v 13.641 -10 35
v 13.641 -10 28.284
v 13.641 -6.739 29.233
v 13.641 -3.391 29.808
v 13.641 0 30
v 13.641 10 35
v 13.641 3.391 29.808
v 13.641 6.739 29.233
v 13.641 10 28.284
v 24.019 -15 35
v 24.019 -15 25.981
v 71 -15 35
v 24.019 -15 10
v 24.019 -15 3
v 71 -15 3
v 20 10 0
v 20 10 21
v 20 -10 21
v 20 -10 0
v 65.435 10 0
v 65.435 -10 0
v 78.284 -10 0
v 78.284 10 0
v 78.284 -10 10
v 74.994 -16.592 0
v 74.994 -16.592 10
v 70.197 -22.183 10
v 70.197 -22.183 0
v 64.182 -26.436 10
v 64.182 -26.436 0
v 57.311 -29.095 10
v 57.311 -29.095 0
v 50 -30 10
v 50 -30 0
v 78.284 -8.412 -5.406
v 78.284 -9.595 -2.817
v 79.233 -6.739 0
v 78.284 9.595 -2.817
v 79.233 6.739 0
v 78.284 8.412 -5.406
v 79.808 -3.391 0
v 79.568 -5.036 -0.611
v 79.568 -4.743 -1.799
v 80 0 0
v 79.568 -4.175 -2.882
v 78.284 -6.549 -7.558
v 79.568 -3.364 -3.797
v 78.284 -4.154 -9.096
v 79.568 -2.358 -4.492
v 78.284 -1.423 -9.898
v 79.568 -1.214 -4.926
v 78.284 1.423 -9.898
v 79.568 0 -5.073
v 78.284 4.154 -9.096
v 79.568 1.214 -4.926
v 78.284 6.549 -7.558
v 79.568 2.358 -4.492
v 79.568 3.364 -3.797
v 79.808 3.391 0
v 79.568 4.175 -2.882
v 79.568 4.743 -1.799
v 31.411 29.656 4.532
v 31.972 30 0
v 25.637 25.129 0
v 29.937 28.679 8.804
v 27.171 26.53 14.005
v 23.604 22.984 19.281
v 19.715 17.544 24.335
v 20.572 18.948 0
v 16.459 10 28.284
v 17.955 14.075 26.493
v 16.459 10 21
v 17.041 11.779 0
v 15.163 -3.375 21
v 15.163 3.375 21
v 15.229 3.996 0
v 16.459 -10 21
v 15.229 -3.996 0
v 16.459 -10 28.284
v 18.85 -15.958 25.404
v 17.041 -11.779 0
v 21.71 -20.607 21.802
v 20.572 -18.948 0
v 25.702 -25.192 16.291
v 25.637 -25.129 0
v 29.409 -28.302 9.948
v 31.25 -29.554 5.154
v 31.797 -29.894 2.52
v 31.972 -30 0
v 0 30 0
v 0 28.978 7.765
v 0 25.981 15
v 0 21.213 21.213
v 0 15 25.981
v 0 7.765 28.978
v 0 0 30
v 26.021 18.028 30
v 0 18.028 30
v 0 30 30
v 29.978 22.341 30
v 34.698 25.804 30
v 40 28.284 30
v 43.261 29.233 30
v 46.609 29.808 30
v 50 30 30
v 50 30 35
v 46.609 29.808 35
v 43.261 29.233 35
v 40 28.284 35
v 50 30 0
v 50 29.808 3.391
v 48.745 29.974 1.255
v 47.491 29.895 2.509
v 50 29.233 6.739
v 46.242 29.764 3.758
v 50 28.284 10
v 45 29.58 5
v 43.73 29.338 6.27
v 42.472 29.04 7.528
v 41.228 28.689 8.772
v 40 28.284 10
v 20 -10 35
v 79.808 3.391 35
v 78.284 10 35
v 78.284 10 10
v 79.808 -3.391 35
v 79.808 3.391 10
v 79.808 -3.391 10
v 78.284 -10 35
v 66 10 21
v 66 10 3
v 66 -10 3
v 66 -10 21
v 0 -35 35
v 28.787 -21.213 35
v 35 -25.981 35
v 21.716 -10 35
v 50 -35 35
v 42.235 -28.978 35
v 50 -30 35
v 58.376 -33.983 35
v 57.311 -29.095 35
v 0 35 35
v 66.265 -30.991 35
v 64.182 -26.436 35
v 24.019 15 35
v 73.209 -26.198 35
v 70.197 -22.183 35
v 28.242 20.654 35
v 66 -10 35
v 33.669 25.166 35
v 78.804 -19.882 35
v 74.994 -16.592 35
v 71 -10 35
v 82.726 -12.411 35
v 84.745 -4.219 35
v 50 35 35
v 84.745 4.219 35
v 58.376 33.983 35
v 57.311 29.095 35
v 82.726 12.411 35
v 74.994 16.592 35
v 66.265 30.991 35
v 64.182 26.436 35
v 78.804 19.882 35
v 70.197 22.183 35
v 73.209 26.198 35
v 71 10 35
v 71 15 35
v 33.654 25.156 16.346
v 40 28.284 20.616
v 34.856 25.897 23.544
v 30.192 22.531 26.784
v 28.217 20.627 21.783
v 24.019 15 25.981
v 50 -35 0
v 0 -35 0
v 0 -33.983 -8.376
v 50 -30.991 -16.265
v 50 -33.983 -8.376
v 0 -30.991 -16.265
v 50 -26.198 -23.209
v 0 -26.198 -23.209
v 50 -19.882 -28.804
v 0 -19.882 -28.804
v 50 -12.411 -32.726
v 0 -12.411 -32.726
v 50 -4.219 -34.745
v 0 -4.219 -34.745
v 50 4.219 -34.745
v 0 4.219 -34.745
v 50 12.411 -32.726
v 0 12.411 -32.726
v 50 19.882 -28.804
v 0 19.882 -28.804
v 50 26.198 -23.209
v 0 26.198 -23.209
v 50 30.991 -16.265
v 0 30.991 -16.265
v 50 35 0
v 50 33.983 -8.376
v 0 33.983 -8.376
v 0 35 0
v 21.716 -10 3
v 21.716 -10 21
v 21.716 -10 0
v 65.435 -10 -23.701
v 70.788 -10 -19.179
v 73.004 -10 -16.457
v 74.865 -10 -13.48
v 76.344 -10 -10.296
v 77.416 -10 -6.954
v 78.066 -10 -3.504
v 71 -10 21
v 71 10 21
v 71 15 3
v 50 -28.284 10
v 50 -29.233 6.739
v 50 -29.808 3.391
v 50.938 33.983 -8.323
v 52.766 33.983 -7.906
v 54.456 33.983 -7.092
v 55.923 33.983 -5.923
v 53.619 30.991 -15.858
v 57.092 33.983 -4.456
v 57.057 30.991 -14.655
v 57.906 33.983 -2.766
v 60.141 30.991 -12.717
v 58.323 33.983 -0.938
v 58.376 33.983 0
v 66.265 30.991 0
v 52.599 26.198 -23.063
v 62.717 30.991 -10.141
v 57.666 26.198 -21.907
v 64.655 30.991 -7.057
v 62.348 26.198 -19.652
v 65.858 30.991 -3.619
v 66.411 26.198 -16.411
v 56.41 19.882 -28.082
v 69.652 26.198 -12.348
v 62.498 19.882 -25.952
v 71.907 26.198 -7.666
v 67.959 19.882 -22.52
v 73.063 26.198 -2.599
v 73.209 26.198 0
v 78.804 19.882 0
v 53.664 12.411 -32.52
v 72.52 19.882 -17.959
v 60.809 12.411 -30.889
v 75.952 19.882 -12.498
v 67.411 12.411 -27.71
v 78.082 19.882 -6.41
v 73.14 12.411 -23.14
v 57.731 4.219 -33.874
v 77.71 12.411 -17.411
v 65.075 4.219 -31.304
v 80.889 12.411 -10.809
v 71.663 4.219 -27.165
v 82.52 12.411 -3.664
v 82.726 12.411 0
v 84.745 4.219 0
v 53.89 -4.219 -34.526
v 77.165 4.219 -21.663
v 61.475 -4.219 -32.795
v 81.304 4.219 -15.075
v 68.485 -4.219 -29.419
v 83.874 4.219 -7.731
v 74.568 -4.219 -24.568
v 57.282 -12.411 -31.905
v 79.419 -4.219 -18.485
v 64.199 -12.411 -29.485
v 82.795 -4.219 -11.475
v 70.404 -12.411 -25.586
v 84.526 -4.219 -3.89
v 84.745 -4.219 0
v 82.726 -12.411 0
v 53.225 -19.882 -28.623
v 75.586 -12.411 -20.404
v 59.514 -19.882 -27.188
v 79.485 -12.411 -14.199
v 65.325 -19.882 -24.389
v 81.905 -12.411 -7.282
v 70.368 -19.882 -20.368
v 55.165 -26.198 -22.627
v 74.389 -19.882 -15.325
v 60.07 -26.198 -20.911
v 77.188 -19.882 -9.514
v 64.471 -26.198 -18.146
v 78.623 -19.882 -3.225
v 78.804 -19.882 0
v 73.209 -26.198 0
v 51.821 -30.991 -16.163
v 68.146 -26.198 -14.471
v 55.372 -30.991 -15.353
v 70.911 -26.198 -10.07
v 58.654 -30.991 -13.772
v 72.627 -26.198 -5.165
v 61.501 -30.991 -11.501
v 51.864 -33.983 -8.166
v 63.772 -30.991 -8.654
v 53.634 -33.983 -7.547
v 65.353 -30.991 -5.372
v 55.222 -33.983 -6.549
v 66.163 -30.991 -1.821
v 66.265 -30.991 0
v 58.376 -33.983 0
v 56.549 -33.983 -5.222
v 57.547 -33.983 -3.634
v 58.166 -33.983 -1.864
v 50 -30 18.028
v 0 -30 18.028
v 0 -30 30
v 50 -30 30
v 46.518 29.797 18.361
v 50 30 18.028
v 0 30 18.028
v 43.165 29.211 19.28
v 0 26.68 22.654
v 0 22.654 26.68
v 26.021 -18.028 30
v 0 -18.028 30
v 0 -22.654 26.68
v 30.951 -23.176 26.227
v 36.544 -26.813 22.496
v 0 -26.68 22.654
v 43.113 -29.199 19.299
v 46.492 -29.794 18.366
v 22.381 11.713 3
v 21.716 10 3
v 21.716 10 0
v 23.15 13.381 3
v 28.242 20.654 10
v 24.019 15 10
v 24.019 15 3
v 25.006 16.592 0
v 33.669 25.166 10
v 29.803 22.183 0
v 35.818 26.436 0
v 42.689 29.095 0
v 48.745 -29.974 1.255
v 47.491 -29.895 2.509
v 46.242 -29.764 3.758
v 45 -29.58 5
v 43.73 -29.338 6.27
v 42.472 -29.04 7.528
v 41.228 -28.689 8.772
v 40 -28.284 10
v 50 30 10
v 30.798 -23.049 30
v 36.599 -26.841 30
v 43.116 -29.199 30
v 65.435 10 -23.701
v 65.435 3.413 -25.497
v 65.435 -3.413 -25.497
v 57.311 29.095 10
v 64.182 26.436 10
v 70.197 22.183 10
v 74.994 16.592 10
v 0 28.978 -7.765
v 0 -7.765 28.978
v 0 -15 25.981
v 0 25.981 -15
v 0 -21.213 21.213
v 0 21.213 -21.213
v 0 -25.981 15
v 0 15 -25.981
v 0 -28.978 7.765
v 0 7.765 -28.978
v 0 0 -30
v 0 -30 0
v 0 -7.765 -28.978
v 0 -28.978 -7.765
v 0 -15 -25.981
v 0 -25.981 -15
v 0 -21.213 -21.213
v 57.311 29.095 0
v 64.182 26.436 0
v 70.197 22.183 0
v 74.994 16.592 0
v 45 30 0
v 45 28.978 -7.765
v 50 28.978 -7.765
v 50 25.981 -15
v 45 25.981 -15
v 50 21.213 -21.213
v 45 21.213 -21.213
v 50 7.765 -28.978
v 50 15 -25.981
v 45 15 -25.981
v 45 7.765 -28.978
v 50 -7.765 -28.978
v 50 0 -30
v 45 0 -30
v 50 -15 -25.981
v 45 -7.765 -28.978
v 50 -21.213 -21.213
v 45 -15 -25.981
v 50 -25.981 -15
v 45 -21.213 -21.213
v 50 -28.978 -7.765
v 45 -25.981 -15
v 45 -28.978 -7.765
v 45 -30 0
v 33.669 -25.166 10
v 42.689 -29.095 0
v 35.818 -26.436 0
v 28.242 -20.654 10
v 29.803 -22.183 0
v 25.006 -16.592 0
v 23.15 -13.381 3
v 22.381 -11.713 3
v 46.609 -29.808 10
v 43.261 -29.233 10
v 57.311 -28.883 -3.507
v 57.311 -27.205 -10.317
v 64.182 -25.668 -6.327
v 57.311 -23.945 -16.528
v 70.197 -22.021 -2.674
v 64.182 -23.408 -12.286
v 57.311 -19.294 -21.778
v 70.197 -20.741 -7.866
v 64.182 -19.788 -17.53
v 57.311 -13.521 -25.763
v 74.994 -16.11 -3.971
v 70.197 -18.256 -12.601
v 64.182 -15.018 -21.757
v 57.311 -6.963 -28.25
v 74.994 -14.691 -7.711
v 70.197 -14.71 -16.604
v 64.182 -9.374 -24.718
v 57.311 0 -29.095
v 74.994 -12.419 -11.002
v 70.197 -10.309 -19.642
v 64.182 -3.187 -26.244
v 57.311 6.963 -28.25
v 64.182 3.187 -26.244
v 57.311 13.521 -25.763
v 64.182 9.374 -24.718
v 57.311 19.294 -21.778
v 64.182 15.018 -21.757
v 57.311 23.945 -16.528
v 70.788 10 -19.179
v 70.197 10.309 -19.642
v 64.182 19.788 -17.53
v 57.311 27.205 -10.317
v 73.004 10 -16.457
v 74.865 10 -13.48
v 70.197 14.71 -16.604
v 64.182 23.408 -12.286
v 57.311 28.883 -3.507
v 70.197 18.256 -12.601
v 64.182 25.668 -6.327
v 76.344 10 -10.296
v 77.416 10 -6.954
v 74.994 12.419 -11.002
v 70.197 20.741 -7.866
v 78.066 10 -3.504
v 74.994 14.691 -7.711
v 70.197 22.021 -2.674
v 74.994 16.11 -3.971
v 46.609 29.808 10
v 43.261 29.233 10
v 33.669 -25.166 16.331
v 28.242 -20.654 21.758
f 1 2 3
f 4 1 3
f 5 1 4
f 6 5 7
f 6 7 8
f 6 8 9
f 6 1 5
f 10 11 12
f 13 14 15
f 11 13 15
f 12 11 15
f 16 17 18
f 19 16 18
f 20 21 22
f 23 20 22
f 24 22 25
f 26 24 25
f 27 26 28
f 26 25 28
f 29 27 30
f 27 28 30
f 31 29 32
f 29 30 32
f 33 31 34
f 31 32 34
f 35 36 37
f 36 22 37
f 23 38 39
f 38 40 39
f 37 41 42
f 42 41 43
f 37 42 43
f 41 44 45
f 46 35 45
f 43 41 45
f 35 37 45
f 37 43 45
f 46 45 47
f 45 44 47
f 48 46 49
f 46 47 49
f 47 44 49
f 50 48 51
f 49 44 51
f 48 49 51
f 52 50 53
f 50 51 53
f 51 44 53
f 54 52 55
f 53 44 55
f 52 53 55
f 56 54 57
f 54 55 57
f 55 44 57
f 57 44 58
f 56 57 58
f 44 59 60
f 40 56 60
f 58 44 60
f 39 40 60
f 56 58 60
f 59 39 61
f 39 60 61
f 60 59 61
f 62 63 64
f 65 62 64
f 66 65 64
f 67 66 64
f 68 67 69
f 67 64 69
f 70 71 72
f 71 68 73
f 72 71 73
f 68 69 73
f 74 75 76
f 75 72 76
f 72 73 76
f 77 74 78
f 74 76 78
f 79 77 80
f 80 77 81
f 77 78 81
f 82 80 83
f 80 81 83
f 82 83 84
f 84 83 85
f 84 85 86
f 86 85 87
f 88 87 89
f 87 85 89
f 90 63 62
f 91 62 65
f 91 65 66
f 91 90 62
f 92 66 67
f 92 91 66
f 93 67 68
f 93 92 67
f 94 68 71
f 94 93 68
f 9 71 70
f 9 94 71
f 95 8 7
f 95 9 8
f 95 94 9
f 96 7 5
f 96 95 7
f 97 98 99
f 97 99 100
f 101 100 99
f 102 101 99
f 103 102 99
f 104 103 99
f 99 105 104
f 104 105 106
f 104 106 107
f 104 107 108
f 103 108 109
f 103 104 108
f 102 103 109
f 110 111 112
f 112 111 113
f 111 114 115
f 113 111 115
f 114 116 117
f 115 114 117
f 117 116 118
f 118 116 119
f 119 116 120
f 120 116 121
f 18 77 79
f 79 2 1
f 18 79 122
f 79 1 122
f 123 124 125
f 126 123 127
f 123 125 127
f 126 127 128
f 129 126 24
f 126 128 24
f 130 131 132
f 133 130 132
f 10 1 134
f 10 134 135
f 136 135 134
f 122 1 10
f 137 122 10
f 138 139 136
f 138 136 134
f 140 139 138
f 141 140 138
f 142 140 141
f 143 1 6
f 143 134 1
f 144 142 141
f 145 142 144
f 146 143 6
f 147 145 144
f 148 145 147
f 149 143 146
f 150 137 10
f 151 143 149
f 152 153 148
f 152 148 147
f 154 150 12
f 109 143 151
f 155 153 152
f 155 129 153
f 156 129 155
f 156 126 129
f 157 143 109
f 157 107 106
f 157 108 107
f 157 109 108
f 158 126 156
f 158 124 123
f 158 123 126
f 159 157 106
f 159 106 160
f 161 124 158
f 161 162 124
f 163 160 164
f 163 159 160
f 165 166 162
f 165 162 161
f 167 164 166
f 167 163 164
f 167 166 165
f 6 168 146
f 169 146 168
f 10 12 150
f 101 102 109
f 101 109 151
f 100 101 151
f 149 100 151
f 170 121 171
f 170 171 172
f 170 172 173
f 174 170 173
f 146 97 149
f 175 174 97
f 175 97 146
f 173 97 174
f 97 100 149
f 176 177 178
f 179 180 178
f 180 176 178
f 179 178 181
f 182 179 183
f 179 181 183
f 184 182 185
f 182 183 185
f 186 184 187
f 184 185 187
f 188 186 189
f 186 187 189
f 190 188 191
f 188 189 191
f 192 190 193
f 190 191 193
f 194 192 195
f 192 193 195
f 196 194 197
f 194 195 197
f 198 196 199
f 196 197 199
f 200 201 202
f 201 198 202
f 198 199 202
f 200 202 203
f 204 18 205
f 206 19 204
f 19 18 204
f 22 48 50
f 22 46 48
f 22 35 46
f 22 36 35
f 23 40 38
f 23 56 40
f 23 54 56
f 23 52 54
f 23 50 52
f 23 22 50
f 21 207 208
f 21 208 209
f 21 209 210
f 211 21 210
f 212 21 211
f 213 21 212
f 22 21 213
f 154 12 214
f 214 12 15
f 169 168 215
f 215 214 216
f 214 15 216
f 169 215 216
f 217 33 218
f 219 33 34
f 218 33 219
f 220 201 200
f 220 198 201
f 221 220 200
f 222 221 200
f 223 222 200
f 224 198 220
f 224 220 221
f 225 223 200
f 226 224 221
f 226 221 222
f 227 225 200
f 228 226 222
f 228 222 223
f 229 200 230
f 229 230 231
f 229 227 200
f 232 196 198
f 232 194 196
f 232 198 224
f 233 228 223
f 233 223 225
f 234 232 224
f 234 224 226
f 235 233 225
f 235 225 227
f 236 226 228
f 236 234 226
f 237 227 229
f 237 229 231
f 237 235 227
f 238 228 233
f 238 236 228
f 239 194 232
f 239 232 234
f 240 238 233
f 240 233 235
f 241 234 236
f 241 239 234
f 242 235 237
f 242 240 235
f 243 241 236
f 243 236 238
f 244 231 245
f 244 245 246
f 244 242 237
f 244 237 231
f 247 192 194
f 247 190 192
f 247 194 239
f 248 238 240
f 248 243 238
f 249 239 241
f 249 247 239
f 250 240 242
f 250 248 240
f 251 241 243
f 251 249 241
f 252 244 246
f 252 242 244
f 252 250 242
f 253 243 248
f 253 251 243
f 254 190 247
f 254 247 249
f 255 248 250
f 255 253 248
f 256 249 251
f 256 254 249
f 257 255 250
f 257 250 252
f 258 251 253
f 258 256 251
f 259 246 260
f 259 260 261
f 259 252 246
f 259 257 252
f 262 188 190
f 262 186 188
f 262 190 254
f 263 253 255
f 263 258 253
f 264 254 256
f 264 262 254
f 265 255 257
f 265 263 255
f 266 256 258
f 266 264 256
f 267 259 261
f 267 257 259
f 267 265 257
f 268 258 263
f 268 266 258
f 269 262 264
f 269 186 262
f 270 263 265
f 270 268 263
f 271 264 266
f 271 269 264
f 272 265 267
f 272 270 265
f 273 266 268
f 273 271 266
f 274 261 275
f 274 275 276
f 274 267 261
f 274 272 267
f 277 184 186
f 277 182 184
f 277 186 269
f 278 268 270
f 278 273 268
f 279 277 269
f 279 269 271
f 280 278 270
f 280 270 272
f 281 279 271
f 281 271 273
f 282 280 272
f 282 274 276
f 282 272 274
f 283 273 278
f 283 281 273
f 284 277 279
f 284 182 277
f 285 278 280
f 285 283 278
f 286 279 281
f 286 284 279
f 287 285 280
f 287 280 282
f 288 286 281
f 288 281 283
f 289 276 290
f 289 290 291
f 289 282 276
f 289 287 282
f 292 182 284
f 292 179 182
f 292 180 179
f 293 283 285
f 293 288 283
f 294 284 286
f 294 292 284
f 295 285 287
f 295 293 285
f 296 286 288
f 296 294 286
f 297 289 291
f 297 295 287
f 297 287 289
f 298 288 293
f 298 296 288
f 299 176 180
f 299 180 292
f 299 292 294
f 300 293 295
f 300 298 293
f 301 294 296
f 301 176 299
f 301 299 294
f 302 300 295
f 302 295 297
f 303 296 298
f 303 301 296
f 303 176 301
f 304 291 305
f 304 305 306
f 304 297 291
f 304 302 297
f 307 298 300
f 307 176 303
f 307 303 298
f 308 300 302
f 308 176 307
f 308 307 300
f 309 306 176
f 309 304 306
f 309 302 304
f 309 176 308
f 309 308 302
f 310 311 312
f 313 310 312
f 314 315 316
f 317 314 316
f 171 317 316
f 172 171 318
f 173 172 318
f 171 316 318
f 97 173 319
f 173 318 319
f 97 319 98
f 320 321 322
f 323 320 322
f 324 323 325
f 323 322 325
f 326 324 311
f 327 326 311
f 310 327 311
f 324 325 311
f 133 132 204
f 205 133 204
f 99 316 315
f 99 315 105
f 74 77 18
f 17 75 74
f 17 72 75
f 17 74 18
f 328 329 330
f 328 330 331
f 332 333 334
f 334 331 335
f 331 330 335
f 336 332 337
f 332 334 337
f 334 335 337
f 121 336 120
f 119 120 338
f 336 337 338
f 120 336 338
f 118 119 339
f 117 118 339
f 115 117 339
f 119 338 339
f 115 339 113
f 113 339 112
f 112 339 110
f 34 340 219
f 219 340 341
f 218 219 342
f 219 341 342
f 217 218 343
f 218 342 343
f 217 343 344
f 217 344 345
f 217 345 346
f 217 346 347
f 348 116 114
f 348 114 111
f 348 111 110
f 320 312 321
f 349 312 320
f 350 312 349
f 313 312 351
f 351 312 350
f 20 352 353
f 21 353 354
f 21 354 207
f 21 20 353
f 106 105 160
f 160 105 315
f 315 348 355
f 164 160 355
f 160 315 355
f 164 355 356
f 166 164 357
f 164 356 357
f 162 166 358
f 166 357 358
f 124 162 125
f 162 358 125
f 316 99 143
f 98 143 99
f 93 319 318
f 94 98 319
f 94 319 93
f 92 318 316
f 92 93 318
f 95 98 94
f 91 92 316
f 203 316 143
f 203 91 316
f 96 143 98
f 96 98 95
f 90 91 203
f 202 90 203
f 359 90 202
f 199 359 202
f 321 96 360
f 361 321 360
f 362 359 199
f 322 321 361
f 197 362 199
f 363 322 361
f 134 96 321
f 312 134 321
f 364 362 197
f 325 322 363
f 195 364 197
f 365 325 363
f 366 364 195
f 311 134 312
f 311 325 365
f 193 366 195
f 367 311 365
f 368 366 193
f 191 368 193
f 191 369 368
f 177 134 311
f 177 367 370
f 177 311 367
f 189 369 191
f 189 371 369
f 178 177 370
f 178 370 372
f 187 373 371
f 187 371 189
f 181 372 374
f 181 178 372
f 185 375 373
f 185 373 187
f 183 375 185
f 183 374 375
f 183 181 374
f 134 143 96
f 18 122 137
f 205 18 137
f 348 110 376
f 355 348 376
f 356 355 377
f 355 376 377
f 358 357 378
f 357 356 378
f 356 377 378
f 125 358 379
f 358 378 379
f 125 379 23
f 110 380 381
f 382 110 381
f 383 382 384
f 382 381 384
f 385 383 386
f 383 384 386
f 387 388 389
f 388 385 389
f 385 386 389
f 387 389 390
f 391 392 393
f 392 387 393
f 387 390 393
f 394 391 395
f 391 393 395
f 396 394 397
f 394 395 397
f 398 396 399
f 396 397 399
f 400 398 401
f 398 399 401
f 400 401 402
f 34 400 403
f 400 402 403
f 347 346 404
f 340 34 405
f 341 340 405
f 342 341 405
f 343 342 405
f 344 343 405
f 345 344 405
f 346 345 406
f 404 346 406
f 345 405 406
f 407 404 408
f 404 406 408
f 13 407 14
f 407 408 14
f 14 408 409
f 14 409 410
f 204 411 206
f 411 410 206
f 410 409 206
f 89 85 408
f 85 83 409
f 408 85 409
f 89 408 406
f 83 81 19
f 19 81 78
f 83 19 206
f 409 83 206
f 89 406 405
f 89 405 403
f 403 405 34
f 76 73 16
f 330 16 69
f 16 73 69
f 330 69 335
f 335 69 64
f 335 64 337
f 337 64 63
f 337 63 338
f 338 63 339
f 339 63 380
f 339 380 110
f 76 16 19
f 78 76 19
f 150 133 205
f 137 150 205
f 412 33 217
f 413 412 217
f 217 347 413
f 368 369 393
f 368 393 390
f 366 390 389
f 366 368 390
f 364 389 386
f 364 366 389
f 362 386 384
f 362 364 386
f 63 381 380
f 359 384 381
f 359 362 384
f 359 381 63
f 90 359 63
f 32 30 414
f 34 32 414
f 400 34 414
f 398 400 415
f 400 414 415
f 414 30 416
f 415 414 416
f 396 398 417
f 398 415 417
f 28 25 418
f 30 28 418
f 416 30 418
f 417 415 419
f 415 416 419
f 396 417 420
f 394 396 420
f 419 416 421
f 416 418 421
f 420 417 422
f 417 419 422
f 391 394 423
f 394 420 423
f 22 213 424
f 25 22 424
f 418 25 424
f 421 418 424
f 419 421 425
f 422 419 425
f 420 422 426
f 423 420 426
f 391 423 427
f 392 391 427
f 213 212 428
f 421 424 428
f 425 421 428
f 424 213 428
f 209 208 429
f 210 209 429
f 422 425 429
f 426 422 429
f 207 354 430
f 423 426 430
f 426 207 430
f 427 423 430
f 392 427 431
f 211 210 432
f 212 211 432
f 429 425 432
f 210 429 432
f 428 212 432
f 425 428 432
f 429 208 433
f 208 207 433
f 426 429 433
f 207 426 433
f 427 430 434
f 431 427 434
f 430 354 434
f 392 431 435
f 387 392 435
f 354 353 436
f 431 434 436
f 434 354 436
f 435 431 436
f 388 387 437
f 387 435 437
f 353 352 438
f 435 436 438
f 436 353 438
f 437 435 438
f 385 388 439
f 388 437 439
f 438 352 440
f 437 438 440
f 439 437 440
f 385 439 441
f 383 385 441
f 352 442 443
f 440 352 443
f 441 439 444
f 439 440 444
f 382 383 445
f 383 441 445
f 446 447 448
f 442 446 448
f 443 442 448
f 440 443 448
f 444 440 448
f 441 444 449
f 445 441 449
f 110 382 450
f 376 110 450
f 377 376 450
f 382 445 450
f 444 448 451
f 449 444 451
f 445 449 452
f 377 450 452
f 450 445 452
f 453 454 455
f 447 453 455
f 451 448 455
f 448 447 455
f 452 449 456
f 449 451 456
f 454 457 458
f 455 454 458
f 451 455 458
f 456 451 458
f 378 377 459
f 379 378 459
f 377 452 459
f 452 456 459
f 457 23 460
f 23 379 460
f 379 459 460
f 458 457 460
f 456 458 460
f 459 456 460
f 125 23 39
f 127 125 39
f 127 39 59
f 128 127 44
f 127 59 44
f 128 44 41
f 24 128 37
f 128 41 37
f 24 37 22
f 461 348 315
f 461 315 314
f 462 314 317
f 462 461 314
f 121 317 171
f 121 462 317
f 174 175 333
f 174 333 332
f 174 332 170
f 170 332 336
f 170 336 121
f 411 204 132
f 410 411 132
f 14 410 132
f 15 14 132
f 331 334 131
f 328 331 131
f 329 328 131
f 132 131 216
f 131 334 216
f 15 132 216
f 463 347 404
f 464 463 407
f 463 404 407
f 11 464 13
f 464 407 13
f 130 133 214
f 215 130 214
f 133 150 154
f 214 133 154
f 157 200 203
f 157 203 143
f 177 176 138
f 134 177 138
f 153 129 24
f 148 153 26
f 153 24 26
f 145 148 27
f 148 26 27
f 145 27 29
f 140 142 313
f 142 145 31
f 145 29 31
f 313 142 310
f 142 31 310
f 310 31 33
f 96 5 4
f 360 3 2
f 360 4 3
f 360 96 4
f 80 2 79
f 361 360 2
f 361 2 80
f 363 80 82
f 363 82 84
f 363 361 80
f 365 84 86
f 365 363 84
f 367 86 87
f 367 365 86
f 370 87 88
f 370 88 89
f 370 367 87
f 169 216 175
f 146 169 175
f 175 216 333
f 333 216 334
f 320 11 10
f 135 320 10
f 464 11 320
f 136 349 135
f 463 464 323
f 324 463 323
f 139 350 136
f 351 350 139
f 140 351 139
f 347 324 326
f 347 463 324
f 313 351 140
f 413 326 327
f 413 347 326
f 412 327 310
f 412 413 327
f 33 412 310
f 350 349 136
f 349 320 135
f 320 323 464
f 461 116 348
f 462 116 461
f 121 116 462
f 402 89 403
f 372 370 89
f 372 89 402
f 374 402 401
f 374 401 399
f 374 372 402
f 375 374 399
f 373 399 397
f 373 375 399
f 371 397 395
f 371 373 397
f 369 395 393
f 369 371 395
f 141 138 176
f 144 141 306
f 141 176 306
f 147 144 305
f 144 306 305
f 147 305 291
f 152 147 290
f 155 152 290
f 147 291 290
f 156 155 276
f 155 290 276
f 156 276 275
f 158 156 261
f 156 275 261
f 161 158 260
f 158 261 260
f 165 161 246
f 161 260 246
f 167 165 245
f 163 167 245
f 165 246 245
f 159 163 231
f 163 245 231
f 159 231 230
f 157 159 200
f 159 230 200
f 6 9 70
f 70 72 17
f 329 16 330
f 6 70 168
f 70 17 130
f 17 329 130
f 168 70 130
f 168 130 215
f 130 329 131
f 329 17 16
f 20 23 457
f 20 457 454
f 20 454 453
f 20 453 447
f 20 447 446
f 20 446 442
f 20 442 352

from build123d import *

# Parameters (mm, degrees)
SKETCH3_R                = 35
SKETCH3_R_2              = 30
BOSS_EXTRUDE1_DEPTH      = 50
BOSS_EXTRUDE2_START      = -5
SKETCH4_R                = 30
BOSS_EXTRUDE2_DEPTH      = 5
REVOLVE1_ANGLE           = 90
SKETCH8_R                = 30
CUT_EXTRUDE2_DEPTH       = 5
BOSS_EXTRUDE4_REACH      = 100.362
BOSS_EXTRUDE4_END_RADIUS = 30
BOSS_EXTRUDE5_REACH      = 100.362
BOSS_EXTRUDE18_DEPTH     = 35
SKETCH13_W               = 35
SKETCH13_H               = 5
BOSS_EXTRUDE19_DEPTH     = 50
BOSS_EXTRUDE20_REACH     = 114.583
SKETCH14_W               = 50
SKETCH14_H               = 5
CUT_EXTRUDE4_START       = -25
SKETCH15_R               = 30
CUT_EXTRUDE4_DEPTH       = 25
CUT_EXTRUDE6_DEPTH       = 116.542200083
CUT_EXTRUDE6_DEPTH_BACK  = 40
BOSS_EXTRUDE21_START     = -32
BOSS_EXTRUDE21_DEPTH     = 32
SKETCH20_W               = 6.358964111
SKETCH20_H               = 20
SKETCH20_W_2             = 46
SKETCH20_W_3             = 5
CUT_EXTRUDE7_DEPTH       = 14


# Read off the part's stored shape, not the designer's step: Shell1
with BuildPart() as part:
    # Sketch3 → Boss-Extrude1 (new body)
    with BuildSketch(Plane(origin=(0, 0, 0), x_dir=(0, 0, -1), z_dir=(1, 0, 0))):
        Circle(SKETCH3_R)
        Circle(SKETCH3_R_2, mode=Mode.SUBTRACT)
    extrude(amount=BOSS_EXTRUDE1_DEPTH)

    # Sketch4 → Boss-Extrude2 (add)
    with BuildSketch(Plane(origin=(50, 0, 0), x_dir=(0, 0, -1), z_dir=(1, 0, 0)).offset(BOSS_EXTRUDE2_START)):
        Circle(SKETCH4_R)
    extrude(amount=BOSS_EXTRUDE2_DEPTH)

    # Sketch5 → Revolve1 (revolve)
    with BuildSketch(Plane(origin=(50, 0, 0), x_dir=(0, 0, -1), z_dir=(1, 0, 0))):
        with BuildLine():
            Line((0, -35), (0, 35))
            ThreePointArc((0, 35), (35, 0), (0, -35))
        make_face()
    revolve(axis=Axis((50, -35, 0), (0, -1, 0)), revolution_arc=REVOLVE1_ANGLE)

    # Shell1 outline → Shell1 (revolve, cut)
    with BuildSketch(Plane.YX):
        with BuildLine():
            Line((0, 80), (0, 50))
            Line((0, 50), (30, 50))
            ThreePointArc((30, 50), (21.213203436, 71.213203436), (0, 80))
        make_face()
    revolve(axis=Axis((0, 0, 0), (1, 0, 0)), mode=Mode.SUBTRACT)

    # Sketch8 → Cut-Extrude2 (cut)
    with BuildSketch(Plane.ZY.offset(-45)):
        with Locations(Location((0, 0, 0), (0, 0, 90))):
            Circle(SKETCH8_R)
    extrude(amount=-CUT_EXTRUDE2_DEPTH, mode=Mode.SUBTRACT)

    # Boss-Extrude4: up to this sphere (the profile starts inside it)
    boss_extrude4_end = Location((50, 0, 0)) * Sphere(BOSS_EXTRUDE4_END_RADIUS, mode=Mode.PRIVATE)
    # Sketch7 → Boss-Extrude4 (add, up to the surface)
    with BuildSketch(Plane.XY, mode=Mode.PRIVATE) as boss_extrude4_sk1:
        Polygon((65.435214922, 10), (65.435214922, 0), (65.435214922, -10), (78.284271247, -10), (78.284271247, 10), align=None)
    boss_extrude4_tool1 = extrude(boss_extrude4_sk1.sketch, amount=-BOSS_EXTRUDE4_REACH, mode=Mode.PRIVATE) & boss_extrude4_end
    add(boss_extrude4_tool1.solids().sort_by_distance((71.859743, 0, 0))[0])

    # Sketch10 → Boss-Extrude5 (add, up to next)
    with BuildSketch(Plane.XY, mode=Mode.PRIVATE) as boss_extrude5_sk1:
        with BuildLine():
            ThreePointArc((50, 35), (15, 0), (50, -35))
            Line((50, -35), (50, -30))
            ThreePointArc((50, -30), (20, 0), (50, 30))
            Line((50, 30), (50, 35))
        make_face()
    boss_extrude5_tool1 = extrude(boss_extrude5_sk1.sketch, amount=BOSS_EXTRUDE5_REACH, mode=Mode.PRIVATE) - part.part
    add(boss_extrude5_tool1.solids().sort_by_distance((49.217376, 32.5, 0))[0])

    # Sketch12 → Boss-Extrude18 (add)
    with BuildSketch(Plane.XY):
        with BuildLine():
            ThreePointArc((78.284271247, 10), (80, 0), (78.284271247, -10))
            ThreePointArc((78.284271247, -10), (67.320508076, -24.494897428), (50, -30))
            Line((50, -30), (50, -35))
            ThreePointArc((50, -35), (85, 0), (50, 35))
            Line((50, 35), (50, 30))
            ThreePointArc((50, 30), (67.320508076, 24.494897428), (78.284271247, 10))
        make_face()
    extrude(amount=BOSS_EXTRUDE18_DEPTH)

    # Sketch13 → Boss-Extrude19 (add)
    with BuildSketch(Plane.ZY.offset(-50)):
        with Locations((17.5, -32.5)):
            Rectangle(SKETCH13_W, SKETCH13_H)
        with Locations((17.5, 32.5)):
            Rectangle(SKETCH13_W, SKETCH13_H)
    extrude(amount=BOSS_EXTRUDE19_DEPTH)

    # Boss-Extrude20: up to this face of the body (flat: up to its plane)
    boss_extrude20_end = Plane(part.part.faces().sort_by_distance((25, 30, 26.513878189))[0])
    # Sketch14 → Boss-Extrude20 (add, up to the picked face)
    with BuildSketch(Plane(origin=(0, -30, 0), x_dir=(1, 0, 0), z_dir=(0, 1, 0)), mode=Mode.PRIVATE) as boss_extrude20_sk1:
        with Locations((25, -32.5)):
            Rectangle(SKETCH14_W, SKETCH14_H)
    boss_extrude20_tool1 = split(extrude(boss_extrude20_sk1.sketch, amount=BOSS_EXTRUDE20_REACH, mode=Mode.PRIVATE), bisect_by=boss_extrude20_end, keep=Keep.BOTH, mode=Mode.PRIVATE)
    add(boss_extrude20_tool1.solids().sort_by(Axis((25, -30, 32.5), (0, 1, 0)))[0])

    # Sketch15 → Cut-Extrude4 (cut)
    with BuildSketch(Plane.XY.offset(35).offset(CUT_EXTRUDE4_START)):
        with Locations(Location((50, 0, 0), (0, 0, 109.471220634))):
            Circle(SKETCH15_R)
    extrude(amount=CUT_EXTRUDE4_DEPTH, mode=Mode.SUBTRACT)

    # Sketch16 → Cut-Extrude6 (cut, two sides: drawn at the far end of the back side and taken through both)
    with BuildSketch(Plane.XY.offset(35).offset(-CUT_EXTRUDE6_DEPTH_BACK)):
        with BuildLine():
            Line((21.715728753, 10), (20, 10))
            Line((20, 10), (20, 0))
            ThreePointArc((20, 0), (20.43204321, 5.073059362), (21.715728753, 10))
        make_face()
        with BuildLine():
            ThreePointArc((21.715728753, -10), (20.43204321, -5.073059362), (20, 0))
            Line((20, 0), (20, -10))
            Line((20, -10), (21.715728753, -10))
        make_face()
    extrude(amount=CUT_EXTRUDE6_DEPTH + CUT_EXTRUDE6_DEPTH_BACK, mode=Mode.SUBTRACT)

    # Sketch16<17> → Boss-Extrude21 (add)
    with BuildSketch(Plane.XY.offset(35).offset(BOSS_EXTRUDE21_START)):
        with BuildLine():
            ThreePointArc((24.019237886, 15), (22.752551286, 12.552949398), (21.715728753, 10))
            Line((21.715728753, 10), (66, 10))
            Line((66, 10), (66, -10))
            Line((66, -10), (21.715728753, -10))
            ThreePointArc((21.715728753, -10), (22.752551286, -12.552949398), (24.019237886, -15))
            Line((24.019237886, -15), (71, -15))
            Line((71, -15), (71, 15))
            Line((71, 15), (24.019237886, 15))
        make_face()
    extrude(amount=BOSS_EXTRUDE21_DEPTH)

    # Sketch20 → Cut-Extrude7 (cut)
    with BuildSketch(Plane.XY.offset(35)):
        with Locations((16.820517945, 0)):
            Rectangle(SKETCH20_W, SKETCH20_H)
        with Locations((43, 0)):
            Rectangle(SKETCH20_W_2, SKETCH20_H)
        with Locations((68.5, 0)):
            Rectangle(SKETCH20_W_3, SKETCH20_H)
    extrude(amount=-CUT_EXTRUDE7_DEPTH, mode=Mode.SUBTRACT)


solid = part.part
